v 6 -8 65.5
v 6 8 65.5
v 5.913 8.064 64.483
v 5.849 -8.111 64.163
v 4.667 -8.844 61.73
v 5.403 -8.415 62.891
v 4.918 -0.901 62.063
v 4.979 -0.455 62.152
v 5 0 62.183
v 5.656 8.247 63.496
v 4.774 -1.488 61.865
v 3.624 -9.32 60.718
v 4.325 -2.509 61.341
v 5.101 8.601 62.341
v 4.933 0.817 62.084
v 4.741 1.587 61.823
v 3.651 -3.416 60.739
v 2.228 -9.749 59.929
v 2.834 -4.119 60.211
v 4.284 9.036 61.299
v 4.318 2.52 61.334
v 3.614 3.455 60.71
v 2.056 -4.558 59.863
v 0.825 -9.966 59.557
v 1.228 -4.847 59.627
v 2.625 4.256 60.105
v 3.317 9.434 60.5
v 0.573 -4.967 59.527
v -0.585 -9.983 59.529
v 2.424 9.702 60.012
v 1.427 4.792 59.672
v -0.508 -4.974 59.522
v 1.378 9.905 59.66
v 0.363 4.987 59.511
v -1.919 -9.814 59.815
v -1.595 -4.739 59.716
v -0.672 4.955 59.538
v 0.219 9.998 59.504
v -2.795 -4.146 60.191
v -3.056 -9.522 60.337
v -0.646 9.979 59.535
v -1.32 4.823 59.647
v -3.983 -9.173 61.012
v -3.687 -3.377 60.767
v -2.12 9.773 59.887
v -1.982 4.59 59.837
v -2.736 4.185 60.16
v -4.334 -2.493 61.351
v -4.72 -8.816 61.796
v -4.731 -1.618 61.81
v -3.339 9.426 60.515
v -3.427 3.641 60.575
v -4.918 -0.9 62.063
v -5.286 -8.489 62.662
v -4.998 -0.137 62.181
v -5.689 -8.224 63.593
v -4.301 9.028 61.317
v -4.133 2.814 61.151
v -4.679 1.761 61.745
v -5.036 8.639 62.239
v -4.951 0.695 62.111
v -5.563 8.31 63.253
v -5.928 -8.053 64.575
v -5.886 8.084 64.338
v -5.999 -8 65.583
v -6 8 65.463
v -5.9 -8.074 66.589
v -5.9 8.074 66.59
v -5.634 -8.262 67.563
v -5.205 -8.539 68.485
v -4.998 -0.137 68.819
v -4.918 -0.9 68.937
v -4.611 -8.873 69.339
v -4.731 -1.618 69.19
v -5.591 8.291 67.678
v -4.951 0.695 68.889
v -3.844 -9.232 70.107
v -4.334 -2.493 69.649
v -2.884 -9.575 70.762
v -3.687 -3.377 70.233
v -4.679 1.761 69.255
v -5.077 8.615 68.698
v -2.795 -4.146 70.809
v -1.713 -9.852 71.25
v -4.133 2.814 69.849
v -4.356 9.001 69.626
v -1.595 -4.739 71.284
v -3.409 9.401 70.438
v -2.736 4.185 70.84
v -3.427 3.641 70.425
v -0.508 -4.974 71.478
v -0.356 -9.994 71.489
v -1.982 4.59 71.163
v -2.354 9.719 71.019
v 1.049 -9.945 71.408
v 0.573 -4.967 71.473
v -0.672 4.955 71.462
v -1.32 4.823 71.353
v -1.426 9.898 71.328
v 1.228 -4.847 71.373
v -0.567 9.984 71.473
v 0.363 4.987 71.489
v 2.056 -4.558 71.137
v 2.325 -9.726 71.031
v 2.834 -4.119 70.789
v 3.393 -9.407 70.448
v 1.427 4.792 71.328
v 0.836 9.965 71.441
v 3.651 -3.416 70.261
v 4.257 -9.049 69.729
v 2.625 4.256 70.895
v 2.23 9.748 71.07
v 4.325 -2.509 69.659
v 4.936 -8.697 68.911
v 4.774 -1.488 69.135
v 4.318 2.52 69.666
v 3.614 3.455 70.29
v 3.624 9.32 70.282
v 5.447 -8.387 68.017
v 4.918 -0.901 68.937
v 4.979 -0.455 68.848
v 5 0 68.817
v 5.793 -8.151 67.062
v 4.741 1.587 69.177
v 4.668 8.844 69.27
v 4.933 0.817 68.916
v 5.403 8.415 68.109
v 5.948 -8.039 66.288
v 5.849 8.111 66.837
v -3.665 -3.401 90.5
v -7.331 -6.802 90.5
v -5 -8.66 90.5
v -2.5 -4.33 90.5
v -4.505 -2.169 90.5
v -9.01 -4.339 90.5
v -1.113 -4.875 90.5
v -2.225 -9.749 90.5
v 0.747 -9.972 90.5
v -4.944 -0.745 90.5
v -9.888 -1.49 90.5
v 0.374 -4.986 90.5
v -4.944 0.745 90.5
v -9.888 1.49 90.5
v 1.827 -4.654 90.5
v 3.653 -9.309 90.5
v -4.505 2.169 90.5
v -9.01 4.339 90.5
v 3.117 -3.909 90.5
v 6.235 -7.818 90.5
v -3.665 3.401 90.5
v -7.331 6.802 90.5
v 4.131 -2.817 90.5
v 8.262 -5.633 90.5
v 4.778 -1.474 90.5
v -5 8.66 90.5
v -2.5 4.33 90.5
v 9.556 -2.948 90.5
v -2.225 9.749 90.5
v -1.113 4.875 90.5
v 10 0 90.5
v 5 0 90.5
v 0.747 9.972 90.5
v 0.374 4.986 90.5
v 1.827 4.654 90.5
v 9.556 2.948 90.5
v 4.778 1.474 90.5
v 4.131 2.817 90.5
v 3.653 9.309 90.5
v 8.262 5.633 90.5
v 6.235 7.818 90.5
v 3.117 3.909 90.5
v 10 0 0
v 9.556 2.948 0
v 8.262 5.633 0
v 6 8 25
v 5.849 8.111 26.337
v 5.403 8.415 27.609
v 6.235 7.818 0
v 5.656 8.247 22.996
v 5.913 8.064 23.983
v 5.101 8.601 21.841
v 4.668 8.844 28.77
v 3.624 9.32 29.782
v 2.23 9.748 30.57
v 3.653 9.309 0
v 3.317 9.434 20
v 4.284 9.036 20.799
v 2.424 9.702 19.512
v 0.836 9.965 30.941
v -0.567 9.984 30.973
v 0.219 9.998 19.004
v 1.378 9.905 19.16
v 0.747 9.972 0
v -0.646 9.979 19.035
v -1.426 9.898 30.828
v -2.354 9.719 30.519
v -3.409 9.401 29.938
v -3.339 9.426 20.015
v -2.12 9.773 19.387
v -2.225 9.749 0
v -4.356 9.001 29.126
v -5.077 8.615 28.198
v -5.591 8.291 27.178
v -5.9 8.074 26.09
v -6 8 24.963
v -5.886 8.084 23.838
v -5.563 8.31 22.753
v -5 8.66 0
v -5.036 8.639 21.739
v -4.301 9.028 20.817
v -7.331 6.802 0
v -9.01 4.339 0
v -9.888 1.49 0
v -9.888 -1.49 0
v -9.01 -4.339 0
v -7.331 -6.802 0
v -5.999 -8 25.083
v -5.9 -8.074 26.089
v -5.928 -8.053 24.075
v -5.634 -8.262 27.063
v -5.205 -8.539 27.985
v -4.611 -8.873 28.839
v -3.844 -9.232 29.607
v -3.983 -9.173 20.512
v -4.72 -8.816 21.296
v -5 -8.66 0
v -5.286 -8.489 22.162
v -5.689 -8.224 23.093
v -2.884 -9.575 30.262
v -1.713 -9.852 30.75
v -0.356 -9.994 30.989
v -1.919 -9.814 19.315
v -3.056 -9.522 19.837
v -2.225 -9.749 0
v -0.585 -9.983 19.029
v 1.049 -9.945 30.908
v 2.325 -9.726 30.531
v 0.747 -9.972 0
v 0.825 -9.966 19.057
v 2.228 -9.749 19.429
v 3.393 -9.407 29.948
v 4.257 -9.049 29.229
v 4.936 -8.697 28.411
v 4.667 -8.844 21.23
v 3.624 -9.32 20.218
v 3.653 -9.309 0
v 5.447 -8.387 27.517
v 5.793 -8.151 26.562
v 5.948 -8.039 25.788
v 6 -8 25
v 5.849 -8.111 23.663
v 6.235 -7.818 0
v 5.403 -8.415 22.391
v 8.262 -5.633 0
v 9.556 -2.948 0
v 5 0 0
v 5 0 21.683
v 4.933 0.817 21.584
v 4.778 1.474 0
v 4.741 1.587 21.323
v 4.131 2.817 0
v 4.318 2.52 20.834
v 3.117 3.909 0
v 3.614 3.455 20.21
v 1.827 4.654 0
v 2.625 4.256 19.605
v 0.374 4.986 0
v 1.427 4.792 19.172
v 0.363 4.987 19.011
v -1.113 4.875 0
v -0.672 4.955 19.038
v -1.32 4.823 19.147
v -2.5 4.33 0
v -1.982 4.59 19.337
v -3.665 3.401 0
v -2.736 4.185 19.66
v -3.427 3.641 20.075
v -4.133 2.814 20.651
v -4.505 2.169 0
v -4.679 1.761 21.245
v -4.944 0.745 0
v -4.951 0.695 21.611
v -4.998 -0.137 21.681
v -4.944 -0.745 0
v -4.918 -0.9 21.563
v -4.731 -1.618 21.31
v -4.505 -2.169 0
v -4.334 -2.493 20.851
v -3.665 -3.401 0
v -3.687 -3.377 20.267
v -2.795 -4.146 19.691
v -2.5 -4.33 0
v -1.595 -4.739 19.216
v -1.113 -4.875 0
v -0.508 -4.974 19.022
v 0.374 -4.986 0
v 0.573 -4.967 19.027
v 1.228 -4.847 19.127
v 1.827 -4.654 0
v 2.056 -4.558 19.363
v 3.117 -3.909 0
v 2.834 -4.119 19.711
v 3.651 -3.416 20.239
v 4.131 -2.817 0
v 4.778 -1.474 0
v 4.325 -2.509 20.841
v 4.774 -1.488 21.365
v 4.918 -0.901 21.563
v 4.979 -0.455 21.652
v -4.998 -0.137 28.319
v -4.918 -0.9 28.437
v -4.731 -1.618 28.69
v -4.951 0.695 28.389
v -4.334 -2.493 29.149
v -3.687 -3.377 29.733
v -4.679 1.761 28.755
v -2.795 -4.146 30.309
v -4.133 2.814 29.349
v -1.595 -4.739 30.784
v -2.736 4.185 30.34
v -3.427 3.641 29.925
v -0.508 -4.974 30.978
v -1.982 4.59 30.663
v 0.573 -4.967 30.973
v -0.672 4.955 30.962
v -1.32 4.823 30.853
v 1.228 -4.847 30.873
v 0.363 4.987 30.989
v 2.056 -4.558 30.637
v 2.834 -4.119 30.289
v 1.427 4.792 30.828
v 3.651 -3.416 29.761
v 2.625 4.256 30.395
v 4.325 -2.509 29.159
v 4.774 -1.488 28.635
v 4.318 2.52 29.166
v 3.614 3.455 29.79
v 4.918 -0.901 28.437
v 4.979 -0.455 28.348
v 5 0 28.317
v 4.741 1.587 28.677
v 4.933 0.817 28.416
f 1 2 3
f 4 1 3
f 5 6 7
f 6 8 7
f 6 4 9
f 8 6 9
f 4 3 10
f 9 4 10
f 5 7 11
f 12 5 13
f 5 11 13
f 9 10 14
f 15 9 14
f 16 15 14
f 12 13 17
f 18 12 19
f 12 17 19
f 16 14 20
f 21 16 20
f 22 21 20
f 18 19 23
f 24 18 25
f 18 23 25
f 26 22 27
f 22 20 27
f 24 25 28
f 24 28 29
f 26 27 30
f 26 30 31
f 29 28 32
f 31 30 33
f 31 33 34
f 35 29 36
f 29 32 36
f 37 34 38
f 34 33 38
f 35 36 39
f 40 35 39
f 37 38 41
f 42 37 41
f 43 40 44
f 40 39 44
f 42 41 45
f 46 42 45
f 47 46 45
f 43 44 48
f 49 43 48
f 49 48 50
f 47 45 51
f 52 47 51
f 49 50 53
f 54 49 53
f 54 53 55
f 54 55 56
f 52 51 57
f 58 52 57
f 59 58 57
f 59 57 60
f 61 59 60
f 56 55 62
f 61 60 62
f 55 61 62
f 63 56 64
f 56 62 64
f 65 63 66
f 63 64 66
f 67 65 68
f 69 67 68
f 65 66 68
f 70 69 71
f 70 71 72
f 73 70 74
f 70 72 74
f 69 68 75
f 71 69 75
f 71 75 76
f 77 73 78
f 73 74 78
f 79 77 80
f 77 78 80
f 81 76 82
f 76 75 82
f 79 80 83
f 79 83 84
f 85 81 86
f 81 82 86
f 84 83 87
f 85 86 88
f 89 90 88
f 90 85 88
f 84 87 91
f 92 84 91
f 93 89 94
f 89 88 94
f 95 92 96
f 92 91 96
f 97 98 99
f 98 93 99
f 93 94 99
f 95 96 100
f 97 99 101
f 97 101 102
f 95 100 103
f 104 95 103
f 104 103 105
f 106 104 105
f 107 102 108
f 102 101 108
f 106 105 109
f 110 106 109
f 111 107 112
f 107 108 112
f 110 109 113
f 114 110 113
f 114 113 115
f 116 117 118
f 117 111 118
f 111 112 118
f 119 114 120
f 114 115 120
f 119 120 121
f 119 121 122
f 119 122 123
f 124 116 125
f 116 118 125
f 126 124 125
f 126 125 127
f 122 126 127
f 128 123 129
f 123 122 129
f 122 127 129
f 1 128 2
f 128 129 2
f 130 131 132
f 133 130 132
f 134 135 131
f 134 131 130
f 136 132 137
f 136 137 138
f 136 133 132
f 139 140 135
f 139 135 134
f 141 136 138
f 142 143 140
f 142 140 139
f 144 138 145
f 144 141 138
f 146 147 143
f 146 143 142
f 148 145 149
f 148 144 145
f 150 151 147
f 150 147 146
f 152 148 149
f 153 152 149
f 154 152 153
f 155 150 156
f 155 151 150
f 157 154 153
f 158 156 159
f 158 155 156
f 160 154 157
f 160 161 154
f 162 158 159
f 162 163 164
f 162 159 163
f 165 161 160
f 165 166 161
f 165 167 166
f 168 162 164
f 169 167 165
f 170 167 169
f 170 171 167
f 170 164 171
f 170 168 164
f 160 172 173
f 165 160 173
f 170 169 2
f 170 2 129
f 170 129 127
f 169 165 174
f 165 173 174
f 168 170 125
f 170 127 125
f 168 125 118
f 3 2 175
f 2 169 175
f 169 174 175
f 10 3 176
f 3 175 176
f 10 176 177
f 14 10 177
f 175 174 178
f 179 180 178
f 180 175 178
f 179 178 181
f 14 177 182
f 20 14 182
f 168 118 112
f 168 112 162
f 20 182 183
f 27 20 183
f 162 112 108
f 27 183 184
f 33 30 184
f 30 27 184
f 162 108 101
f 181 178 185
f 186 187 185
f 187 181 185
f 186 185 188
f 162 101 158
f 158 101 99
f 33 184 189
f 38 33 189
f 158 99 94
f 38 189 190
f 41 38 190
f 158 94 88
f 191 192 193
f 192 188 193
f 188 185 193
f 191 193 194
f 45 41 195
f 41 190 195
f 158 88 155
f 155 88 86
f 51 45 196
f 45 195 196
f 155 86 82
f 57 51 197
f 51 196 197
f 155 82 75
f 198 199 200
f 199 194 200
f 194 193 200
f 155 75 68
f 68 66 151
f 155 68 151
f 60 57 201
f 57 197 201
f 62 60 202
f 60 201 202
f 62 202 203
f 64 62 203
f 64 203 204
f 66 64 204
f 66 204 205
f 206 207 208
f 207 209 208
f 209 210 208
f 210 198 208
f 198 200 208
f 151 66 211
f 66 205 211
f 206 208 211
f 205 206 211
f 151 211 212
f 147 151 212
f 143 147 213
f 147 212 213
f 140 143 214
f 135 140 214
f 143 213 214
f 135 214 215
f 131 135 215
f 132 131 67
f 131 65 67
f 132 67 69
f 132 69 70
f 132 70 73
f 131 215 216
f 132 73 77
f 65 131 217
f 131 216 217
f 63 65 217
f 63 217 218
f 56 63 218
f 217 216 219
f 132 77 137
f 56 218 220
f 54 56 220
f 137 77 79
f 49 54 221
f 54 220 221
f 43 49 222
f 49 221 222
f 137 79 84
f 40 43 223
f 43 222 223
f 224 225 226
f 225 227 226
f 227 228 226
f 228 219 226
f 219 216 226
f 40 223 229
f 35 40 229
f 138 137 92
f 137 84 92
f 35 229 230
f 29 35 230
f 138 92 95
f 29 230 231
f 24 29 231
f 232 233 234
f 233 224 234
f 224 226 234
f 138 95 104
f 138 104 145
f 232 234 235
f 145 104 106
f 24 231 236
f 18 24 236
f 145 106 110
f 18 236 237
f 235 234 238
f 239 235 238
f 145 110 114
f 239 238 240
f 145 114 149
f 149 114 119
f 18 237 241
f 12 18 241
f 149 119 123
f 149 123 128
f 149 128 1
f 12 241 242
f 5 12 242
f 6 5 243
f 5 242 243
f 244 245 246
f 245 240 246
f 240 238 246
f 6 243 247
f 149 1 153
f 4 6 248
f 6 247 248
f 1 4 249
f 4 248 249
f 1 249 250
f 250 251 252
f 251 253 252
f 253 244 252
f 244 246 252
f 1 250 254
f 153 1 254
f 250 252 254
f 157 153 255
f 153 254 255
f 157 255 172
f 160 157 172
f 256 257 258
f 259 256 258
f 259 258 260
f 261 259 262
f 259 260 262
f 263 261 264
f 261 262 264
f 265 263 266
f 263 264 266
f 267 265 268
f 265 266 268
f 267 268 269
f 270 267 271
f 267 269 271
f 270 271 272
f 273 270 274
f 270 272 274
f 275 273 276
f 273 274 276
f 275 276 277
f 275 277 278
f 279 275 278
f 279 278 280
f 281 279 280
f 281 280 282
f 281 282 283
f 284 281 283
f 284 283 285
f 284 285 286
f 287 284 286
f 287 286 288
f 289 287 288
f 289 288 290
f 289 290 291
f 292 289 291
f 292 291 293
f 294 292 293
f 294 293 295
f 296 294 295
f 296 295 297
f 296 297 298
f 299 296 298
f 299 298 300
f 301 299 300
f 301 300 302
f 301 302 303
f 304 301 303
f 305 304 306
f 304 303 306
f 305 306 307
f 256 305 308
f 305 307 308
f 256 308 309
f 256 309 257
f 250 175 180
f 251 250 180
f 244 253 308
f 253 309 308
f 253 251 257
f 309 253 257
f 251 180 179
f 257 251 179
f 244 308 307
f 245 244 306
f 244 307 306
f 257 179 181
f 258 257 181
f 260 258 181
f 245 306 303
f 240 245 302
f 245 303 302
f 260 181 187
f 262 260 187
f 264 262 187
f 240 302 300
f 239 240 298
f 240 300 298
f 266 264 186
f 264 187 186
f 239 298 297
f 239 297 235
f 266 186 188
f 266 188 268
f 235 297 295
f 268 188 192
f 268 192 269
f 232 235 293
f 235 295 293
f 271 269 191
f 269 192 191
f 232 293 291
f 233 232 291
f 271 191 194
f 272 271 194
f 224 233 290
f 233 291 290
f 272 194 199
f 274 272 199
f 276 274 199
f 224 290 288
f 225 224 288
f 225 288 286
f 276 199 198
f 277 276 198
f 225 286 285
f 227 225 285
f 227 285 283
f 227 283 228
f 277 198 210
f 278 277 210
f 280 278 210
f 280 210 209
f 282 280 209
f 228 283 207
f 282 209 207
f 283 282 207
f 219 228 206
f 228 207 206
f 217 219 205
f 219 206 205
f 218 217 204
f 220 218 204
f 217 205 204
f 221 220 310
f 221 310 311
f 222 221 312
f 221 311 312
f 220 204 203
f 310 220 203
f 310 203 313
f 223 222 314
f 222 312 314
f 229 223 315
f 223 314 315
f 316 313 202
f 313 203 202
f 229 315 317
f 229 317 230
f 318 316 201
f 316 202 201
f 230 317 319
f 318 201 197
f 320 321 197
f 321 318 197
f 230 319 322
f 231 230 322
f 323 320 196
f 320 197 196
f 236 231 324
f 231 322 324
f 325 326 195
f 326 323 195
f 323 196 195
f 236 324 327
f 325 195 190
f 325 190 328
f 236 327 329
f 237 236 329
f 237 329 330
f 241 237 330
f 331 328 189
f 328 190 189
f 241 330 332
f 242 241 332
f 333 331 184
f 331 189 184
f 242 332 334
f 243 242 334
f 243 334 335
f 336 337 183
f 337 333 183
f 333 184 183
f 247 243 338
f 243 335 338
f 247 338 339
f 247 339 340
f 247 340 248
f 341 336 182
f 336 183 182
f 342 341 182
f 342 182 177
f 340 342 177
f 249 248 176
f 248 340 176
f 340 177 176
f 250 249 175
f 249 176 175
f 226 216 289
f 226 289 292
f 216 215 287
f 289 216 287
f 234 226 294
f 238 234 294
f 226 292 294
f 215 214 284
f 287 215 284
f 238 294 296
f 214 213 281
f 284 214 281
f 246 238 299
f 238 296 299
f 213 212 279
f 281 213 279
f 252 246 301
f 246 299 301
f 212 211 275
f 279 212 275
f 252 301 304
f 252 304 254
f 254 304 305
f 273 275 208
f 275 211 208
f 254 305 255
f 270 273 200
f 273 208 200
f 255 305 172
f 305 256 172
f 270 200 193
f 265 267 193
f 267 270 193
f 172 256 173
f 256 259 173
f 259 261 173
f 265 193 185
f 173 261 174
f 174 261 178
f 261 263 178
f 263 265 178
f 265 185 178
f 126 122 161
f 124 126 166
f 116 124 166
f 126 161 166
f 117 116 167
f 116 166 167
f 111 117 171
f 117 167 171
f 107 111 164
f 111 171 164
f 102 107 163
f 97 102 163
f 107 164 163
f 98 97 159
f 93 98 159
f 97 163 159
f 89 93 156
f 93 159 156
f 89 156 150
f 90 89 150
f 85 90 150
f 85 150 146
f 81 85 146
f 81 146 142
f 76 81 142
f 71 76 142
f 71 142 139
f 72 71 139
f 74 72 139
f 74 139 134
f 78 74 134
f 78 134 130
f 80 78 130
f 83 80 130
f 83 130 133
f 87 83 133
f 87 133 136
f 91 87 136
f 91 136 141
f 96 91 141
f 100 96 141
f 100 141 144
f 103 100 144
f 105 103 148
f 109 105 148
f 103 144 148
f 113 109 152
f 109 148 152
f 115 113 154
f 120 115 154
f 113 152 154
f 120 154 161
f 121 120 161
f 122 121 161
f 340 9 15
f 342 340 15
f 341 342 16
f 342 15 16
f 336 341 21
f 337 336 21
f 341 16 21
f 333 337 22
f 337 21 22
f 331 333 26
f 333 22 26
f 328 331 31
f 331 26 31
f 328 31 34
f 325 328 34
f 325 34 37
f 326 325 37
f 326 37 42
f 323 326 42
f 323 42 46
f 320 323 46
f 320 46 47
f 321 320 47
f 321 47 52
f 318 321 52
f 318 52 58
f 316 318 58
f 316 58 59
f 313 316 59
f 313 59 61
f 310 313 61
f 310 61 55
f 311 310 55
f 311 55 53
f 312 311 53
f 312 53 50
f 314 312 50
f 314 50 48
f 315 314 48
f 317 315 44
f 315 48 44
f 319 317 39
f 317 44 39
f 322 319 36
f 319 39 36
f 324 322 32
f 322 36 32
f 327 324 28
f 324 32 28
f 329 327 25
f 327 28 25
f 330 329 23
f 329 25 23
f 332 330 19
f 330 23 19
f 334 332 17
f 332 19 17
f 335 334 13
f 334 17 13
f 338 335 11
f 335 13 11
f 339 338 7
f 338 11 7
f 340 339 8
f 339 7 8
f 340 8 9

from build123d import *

# Parameters (mm, degrees)
SKETCH1_R           = 10
BOSS_EXTRUDE1_DEPTH = 90.5
SKETCH2_R           = 5
CUT_EXTRUDE1_DEPTH  = 91.5
SKETCH3_R           = 6
CUT_EXTRUDE2_DEPTH  = 21


with BuildPart() as part:
    # Sketch1 → Boss-Extrude1 (new body)
    with BuildSketch(Plane.XY):
        Circle(SKETCH1_R)
    extrude(amount=BOSS_EXTRUDE1_DEPTH)

    # Sketch2 → Cut-Extrude1 (cut, through all)
    with BuildSketch(Plane.XY.offset(90.5)):
        Circle(SKETCH2_R)
    extrude(amount=-CUT_EXTRUDE1_DEPTH, mode=Mode.SUBTRACT)

    # Sketch3 → Cut-Extrude2 (cut, through all)
    with BuildSketch(Plane(origin=(0, 10, 0), x_dir=(1, 0, 0), z_dir=(0, 1, 0))):
        with Locations((0, -25)):
            Circle(SKETCH3_R)
        with Locations((0, -65.5)):
            Circle(SKETCH3_R)
    extrude(amount=-CUT_EXTRUDE2_DEPTH, mode=Mode.SUBTRACT)


solid = part.part
